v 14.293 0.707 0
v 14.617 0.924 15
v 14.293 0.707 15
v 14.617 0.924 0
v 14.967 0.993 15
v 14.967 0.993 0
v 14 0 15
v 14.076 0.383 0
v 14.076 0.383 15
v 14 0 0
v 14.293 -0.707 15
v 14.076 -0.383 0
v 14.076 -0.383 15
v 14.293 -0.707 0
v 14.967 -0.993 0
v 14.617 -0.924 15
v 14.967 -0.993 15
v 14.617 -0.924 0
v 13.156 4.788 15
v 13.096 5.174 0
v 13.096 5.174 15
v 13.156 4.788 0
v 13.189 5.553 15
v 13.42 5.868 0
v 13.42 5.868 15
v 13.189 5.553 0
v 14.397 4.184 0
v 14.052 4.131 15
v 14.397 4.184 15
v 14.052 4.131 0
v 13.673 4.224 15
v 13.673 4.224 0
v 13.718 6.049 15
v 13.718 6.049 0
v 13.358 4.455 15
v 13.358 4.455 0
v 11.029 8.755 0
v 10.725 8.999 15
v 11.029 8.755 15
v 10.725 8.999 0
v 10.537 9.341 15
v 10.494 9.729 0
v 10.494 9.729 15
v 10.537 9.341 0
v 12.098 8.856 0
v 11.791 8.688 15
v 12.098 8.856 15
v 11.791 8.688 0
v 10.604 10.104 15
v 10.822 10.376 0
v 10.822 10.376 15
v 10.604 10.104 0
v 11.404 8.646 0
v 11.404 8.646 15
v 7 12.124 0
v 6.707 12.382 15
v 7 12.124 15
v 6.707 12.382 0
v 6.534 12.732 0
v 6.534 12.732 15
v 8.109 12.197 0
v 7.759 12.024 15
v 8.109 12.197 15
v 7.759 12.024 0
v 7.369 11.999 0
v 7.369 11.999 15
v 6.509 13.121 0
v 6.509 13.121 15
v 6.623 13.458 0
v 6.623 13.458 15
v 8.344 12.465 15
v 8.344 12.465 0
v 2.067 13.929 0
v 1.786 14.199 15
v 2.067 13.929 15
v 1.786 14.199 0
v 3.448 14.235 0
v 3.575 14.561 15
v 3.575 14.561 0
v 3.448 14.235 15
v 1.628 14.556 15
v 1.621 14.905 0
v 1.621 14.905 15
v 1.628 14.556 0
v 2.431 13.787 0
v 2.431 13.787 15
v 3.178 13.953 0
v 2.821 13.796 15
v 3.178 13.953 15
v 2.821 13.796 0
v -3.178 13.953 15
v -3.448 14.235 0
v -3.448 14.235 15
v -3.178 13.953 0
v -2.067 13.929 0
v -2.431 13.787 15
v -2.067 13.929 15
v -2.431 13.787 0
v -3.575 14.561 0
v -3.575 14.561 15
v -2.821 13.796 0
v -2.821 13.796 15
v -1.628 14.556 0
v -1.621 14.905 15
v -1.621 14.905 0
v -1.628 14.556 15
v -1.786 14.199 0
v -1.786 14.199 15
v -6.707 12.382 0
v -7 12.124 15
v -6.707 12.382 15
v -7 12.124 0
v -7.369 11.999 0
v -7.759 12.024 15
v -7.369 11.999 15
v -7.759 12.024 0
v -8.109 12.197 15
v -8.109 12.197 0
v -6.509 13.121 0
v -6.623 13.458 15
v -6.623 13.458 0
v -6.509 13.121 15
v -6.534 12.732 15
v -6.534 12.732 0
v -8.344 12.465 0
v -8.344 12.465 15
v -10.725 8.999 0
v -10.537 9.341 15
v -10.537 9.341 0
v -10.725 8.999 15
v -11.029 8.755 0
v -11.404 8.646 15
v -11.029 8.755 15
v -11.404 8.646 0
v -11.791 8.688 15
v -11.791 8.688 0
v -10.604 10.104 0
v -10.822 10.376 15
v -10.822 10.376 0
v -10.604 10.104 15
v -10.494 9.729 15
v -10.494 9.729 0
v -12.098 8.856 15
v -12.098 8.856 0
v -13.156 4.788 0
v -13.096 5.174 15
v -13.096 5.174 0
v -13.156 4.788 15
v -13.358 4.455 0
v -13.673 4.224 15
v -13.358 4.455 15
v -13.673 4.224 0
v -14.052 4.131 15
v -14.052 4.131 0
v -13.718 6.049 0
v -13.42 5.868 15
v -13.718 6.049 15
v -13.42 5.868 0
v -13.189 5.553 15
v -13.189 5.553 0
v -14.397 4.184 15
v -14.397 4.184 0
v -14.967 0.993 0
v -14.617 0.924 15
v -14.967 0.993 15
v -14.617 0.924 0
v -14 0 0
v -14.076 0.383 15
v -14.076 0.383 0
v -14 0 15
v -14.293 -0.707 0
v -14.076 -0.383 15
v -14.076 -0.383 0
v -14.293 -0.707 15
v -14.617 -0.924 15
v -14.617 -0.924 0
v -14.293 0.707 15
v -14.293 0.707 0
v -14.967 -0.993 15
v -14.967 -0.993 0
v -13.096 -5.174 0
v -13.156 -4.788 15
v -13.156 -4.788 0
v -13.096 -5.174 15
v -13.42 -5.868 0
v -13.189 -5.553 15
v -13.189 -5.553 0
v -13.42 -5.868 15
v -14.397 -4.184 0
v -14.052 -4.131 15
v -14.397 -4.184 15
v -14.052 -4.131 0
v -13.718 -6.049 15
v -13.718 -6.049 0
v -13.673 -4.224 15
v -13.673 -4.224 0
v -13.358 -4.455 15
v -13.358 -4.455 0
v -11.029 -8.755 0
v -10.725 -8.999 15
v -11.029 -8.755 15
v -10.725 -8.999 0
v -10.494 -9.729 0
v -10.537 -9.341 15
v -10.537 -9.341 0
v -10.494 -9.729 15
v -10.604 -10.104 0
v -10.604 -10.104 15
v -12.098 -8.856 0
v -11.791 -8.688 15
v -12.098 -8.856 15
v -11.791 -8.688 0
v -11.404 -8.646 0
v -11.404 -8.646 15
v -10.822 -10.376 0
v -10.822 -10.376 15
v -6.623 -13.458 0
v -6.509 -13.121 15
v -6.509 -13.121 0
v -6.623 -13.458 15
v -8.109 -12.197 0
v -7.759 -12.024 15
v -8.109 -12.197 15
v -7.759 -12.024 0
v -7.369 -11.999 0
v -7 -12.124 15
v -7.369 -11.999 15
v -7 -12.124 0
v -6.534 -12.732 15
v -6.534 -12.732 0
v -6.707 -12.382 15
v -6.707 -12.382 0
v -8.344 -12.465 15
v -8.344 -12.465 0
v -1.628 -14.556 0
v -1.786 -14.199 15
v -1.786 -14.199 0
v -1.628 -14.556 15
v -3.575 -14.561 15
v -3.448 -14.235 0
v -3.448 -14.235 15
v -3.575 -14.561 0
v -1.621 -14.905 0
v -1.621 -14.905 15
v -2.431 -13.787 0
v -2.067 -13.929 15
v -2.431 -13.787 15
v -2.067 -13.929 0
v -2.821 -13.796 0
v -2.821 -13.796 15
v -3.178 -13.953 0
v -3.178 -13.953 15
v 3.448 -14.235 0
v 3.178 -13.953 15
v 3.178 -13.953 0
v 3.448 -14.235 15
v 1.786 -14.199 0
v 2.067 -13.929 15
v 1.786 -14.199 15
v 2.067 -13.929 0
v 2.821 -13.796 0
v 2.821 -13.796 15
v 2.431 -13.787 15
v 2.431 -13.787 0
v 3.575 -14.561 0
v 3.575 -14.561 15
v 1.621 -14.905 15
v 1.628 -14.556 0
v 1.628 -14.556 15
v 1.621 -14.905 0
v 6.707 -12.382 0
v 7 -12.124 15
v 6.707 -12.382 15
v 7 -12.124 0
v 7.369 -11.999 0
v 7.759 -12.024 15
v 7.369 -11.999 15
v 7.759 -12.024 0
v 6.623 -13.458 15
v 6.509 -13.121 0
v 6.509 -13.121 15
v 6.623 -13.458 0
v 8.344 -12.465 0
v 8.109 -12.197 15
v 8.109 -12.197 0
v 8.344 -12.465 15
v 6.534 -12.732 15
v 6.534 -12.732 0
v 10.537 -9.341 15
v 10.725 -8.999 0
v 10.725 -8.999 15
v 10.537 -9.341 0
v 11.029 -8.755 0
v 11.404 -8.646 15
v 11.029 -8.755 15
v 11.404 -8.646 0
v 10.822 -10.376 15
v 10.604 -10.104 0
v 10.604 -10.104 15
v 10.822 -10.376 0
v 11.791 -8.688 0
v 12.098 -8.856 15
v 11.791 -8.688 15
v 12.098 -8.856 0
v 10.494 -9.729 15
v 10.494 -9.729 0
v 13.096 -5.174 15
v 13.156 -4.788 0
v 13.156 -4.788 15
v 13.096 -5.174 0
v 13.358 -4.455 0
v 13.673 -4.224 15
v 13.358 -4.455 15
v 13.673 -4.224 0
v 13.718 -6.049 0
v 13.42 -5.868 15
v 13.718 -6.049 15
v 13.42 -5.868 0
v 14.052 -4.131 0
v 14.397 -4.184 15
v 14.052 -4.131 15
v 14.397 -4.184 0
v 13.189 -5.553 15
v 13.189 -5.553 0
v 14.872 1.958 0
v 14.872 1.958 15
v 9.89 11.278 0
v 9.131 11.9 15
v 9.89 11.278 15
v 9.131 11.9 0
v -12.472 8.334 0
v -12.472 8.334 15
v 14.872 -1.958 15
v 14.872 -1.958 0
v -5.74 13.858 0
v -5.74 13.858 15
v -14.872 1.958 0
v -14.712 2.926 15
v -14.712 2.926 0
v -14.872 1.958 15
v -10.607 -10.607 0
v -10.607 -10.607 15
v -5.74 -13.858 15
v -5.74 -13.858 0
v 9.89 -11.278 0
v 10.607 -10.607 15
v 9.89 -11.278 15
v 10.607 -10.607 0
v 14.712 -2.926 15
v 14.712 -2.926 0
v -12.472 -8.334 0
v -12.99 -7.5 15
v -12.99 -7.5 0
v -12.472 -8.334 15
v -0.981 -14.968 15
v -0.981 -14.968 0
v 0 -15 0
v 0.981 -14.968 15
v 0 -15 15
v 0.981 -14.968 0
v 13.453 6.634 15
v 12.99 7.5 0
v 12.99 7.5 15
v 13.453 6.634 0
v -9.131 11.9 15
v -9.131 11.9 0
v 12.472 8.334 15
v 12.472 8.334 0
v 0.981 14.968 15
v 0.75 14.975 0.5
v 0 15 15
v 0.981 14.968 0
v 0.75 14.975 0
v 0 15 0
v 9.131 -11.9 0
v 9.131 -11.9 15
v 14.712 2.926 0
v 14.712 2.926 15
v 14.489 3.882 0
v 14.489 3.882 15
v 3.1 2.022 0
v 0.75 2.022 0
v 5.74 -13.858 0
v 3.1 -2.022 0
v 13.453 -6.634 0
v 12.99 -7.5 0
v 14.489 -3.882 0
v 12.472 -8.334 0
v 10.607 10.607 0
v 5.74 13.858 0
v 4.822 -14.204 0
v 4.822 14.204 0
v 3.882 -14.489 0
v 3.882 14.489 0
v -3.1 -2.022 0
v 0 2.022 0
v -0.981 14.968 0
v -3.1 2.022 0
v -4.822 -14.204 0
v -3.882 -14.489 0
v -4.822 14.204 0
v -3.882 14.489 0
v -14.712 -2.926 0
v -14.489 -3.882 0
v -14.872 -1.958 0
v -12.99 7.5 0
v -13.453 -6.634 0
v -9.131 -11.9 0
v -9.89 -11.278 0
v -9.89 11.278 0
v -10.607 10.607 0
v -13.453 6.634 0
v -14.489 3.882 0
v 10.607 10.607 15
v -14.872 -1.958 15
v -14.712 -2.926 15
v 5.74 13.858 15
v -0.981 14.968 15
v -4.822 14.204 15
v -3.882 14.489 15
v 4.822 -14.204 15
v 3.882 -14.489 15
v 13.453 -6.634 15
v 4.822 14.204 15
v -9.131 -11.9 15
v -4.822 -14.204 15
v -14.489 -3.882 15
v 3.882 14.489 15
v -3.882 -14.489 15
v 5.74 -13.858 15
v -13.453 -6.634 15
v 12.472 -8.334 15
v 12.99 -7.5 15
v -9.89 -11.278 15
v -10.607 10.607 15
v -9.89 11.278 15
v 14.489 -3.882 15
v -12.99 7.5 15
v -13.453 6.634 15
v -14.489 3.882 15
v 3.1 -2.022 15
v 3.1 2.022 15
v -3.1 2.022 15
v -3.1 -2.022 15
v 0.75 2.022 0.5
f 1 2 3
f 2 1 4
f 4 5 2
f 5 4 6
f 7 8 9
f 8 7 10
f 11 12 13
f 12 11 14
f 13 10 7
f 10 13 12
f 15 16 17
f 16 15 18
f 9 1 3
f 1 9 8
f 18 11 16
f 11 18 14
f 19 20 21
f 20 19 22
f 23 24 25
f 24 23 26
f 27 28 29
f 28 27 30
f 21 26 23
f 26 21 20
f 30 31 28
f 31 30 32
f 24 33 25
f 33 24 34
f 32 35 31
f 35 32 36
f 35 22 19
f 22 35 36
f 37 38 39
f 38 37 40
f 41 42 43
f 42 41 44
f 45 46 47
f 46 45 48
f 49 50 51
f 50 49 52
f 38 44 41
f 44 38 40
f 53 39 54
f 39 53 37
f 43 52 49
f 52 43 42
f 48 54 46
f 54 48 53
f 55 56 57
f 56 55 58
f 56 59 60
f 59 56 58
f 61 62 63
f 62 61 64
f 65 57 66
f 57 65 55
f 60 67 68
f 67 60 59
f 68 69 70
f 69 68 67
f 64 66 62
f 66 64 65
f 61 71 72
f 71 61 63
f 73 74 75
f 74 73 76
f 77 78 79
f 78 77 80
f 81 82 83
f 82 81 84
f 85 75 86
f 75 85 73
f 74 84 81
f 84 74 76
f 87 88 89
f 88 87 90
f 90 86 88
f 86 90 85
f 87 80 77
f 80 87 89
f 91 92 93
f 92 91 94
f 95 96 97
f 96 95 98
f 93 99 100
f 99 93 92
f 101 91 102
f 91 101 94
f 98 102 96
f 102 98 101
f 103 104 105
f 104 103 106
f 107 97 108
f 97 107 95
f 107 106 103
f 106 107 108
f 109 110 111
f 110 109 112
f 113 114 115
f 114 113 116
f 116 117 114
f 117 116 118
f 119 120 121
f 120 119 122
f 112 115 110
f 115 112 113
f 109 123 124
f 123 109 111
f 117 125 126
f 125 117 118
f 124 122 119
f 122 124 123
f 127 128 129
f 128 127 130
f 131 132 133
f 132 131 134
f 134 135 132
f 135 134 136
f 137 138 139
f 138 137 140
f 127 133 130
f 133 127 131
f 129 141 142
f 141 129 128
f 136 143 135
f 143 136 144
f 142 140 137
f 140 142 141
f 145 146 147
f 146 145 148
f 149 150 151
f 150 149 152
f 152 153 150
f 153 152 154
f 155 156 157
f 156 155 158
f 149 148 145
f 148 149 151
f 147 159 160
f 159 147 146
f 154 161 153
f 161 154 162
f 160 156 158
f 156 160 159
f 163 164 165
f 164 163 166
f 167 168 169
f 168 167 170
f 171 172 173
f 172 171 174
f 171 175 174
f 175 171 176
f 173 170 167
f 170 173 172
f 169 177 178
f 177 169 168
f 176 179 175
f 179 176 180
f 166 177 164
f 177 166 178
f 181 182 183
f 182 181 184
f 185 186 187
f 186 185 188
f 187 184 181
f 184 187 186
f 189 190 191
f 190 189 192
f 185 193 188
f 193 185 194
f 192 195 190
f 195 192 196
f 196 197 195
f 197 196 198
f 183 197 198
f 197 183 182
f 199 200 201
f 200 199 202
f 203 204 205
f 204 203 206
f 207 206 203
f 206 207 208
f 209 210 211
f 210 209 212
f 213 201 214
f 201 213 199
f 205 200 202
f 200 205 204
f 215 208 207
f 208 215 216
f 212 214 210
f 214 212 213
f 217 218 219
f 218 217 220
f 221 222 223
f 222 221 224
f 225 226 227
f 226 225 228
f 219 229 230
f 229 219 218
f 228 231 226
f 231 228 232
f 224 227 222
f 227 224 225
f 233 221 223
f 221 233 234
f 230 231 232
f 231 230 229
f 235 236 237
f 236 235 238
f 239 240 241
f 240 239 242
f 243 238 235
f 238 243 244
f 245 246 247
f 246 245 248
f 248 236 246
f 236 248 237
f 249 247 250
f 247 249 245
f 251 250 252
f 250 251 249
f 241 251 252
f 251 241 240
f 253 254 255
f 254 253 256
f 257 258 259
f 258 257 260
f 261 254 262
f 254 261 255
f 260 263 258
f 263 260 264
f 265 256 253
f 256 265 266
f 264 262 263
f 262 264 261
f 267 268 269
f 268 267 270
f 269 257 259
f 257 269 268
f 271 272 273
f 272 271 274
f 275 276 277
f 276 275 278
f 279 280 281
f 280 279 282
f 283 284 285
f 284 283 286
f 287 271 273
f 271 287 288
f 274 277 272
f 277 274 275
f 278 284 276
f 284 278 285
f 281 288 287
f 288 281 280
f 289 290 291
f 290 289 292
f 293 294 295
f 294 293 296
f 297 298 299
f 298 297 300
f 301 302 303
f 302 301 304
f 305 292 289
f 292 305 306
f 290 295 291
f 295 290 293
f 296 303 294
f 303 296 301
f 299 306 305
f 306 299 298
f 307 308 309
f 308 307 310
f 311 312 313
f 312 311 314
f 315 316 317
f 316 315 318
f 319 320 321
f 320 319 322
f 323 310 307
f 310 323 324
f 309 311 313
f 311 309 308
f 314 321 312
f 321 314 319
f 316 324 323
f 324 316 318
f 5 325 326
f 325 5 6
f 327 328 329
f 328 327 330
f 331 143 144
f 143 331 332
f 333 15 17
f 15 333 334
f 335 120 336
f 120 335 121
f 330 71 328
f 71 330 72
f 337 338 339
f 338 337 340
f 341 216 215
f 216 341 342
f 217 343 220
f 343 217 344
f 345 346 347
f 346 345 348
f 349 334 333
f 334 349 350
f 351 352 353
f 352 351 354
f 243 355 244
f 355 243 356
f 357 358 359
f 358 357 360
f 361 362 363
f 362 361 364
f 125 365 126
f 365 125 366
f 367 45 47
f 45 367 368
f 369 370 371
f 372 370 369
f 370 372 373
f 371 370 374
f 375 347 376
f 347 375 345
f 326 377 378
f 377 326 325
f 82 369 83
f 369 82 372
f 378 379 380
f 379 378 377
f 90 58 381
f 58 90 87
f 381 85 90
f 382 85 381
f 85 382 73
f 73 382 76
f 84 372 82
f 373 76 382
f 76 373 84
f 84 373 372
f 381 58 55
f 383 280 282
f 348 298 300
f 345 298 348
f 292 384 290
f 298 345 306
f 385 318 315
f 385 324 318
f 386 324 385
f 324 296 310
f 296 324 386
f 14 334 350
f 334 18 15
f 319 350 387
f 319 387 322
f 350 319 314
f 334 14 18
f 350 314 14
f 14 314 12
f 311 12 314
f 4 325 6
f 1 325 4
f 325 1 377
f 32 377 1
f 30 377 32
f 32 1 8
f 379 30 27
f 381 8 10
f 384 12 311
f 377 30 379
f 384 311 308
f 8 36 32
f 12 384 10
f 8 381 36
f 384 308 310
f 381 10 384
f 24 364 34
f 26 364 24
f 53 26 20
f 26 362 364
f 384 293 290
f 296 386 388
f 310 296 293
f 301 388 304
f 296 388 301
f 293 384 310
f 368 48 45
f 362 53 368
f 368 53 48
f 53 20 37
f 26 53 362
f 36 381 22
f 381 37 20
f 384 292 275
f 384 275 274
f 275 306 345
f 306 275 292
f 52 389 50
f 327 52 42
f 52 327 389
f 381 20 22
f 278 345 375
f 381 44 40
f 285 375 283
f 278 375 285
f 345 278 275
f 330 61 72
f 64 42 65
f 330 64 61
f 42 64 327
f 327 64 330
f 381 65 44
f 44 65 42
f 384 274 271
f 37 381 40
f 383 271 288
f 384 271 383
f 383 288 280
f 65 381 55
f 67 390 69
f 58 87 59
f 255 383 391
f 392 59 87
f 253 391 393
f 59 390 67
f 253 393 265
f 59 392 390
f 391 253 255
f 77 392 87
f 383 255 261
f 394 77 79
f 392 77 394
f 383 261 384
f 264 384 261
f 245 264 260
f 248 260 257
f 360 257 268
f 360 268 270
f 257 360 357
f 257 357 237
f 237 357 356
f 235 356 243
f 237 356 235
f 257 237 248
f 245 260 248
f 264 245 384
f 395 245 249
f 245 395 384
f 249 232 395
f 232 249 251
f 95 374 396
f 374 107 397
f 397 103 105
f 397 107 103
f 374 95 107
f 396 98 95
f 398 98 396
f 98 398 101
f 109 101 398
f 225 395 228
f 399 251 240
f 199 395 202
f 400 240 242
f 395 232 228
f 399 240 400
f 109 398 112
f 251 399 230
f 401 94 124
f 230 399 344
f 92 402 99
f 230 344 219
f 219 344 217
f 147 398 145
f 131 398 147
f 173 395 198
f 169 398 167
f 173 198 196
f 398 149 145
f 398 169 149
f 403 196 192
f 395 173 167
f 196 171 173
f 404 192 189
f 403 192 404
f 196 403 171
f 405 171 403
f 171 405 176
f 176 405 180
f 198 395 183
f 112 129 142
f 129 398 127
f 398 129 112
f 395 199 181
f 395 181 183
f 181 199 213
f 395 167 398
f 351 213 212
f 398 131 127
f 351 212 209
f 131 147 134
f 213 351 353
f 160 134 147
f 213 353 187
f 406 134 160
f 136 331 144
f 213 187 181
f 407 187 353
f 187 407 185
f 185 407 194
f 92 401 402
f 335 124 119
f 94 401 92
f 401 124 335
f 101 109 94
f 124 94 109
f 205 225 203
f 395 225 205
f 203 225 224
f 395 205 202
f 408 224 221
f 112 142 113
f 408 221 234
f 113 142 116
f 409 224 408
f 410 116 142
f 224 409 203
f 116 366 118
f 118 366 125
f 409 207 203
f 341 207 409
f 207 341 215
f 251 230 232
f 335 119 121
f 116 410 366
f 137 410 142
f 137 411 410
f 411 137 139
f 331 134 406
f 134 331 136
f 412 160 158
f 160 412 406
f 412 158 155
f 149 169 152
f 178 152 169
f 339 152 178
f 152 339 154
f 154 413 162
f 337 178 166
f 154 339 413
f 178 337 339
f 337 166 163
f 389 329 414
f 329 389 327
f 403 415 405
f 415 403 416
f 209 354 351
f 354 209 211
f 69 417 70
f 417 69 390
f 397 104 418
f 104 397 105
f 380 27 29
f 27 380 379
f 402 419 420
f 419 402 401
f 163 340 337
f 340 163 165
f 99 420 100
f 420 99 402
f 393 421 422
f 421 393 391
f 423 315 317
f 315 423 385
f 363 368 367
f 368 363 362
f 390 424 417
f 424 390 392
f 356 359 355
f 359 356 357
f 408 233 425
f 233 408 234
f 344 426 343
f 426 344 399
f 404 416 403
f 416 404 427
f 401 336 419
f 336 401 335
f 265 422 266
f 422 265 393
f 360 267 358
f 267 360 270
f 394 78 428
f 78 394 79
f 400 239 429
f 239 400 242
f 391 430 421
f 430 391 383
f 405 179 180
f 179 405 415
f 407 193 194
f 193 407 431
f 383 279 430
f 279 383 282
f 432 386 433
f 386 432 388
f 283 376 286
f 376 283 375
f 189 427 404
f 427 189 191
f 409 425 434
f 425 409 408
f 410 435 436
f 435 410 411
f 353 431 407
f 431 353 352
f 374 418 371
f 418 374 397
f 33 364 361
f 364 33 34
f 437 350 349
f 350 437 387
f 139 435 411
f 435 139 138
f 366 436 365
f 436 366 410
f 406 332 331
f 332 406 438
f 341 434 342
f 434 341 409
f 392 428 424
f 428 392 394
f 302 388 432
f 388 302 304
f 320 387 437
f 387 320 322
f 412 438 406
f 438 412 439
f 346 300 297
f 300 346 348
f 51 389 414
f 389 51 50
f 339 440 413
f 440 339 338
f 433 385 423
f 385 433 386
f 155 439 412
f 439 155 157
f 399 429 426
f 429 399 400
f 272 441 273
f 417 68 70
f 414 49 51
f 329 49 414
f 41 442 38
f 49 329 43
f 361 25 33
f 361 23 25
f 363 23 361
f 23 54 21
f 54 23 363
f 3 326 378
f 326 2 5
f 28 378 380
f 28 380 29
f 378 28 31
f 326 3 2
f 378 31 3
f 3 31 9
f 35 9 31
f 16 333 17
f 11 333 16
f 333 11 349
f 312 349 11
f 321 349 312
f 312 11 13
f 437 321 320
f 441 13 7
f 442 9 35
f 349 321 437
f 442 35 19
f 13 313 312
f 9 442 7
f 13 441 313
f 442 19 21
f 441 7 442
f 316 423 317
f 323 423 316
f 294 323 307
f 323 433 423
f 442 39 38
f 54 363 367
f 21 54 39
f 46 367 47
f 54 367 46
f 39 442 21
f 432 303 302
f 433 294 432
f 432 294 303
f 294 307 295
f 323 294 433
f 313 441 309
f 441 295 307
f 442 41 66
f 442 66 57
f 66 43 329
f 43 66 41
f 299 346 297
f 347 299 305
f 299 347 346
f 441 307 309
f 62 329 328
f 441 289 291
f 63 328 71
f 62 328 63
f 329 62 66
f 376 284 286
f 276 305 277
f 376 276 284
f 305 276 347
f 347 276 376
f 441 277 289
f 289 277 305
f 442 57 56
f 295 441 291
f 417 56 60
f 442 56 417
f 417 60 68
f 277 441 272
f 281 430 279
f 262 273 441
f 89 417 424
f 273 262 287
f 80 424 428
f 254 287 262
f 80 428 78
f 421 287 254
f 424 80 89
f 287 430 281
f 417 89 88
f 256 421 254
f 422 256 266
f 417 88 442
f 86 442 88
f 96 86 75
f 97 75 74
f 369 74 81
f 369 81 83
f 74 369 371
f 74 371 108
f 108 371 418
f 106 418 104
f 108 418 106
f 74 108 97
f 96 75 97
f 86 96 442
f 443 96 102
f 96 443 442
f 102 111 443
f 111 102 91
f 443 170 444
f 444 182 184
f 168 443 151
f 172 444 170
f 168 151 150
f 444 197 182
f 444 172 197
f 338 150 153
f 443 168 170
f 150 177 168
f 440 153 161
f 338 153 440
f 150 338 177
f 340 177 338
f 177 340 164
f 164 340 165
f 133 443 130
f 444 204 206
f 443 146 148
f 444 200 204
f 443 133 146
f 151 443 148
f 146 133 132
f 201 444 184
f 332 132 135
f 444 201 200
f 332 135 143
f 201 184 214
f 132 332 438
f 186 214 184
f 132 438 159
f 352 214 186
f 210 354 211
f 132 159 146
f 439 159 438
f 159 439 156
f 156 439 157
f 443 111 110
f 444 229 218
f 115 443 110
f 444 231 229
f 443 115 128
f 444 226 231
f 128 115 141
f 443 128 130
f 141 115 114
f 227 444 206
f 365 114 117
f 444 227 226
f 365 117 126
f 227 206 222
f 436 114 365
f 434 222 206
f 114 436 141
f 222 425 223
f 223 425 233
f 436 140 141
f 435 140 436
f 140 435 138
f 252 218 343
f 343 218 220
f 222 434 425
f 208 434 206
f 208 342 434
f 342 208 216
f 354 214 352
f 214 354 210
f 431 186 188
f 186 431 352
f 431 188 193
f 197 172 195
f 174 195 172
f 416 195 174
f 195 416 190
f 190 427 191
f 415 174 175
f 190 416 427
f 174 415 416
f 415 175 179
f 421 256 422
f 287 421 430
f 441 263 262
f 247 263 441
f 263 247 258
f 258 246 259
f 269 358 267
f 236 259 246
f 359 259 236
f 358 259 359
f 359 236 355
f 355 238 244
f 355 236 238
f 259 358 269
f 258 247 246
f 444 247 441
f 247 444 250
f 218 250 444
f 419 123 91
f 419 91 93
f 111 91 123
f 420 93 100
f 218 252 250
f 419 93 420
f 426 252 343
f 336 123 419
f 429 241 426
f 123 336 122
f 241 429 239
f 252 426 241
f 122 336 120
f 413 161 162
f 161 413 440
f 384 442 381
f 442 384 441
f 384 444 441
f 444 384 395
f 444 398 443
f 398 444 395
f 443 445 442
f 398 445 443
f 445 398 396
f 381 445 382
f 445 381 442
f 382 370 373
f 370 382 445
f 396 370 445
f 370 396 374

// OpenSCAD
// Replacement knob for hotplate stirrer (D-shaft 6 mm)
// Print orientation: bottom face (with D-bore) on bed, z = 0

// ---------- Parameters ----------
knob_d        = 30;    // knob outer diameter
knob_h        = 15;    // knob height
shaft_d       = 6.2;   // D-bore diameter
shaft_flat    = 4.7;   // distance from D-flat to opposite side
groove_count  = 18;    // number of vertical grip grooves
groove_d      = 2;     // groove diameter (half-cylinder)
pointer_w     = 1.5;   // pointer groove width
pointer_d     = 1;     // pointer groove depth
eps           = 0.5;   // overcut for clean differences

$fn = 96;

// ---------- Derived ----------
R = knob_d / 2;
// half-chord of D: distance from bore centre to flat edge
half_chord = sqrt((shaft_d / 2)^2 - (shaft_flat / 2)^2);

// ---------- Model ----------
difference() {
    // Main body
    cylinder(d = knob_d, h = knob_h);

    // D-shaped blind bore from bottom face
    translate([0, 0, -eps])
        linear_extrude(height = knob_h + 2 * eps)
            polygon([[-shaft_d / 2, -half_chord],
                     [ shaft_d / 2, -half_chord],
                     [ shaft_d / 2,  half_chord],
                     [-(shaft_d / 2),  half_chord]]);

    // Vertical grip grooves along full height
    for (i = [0 : groove_count - 1])
        rotate([0, 0, i * 360 / groove_count])
            translate([R, 0, -eps])
                cylinder(d = groove_d, h = knob_h + 2 * eps, $fn = 16);

    // Pointer groove on top face, centred on +X axis
    translate([0, R + eps, 0])
        rotate([90, 0, 0])
            linear_extrude(height = knob_h + 2 * eps)
                polygon([[-pointer_w / 2, -pointer_d / 2],
                         [ pointer_w / 2, -pointer_d / 2],
                         [ pointer_w / 2,  pointer_d / 2]]);
}
